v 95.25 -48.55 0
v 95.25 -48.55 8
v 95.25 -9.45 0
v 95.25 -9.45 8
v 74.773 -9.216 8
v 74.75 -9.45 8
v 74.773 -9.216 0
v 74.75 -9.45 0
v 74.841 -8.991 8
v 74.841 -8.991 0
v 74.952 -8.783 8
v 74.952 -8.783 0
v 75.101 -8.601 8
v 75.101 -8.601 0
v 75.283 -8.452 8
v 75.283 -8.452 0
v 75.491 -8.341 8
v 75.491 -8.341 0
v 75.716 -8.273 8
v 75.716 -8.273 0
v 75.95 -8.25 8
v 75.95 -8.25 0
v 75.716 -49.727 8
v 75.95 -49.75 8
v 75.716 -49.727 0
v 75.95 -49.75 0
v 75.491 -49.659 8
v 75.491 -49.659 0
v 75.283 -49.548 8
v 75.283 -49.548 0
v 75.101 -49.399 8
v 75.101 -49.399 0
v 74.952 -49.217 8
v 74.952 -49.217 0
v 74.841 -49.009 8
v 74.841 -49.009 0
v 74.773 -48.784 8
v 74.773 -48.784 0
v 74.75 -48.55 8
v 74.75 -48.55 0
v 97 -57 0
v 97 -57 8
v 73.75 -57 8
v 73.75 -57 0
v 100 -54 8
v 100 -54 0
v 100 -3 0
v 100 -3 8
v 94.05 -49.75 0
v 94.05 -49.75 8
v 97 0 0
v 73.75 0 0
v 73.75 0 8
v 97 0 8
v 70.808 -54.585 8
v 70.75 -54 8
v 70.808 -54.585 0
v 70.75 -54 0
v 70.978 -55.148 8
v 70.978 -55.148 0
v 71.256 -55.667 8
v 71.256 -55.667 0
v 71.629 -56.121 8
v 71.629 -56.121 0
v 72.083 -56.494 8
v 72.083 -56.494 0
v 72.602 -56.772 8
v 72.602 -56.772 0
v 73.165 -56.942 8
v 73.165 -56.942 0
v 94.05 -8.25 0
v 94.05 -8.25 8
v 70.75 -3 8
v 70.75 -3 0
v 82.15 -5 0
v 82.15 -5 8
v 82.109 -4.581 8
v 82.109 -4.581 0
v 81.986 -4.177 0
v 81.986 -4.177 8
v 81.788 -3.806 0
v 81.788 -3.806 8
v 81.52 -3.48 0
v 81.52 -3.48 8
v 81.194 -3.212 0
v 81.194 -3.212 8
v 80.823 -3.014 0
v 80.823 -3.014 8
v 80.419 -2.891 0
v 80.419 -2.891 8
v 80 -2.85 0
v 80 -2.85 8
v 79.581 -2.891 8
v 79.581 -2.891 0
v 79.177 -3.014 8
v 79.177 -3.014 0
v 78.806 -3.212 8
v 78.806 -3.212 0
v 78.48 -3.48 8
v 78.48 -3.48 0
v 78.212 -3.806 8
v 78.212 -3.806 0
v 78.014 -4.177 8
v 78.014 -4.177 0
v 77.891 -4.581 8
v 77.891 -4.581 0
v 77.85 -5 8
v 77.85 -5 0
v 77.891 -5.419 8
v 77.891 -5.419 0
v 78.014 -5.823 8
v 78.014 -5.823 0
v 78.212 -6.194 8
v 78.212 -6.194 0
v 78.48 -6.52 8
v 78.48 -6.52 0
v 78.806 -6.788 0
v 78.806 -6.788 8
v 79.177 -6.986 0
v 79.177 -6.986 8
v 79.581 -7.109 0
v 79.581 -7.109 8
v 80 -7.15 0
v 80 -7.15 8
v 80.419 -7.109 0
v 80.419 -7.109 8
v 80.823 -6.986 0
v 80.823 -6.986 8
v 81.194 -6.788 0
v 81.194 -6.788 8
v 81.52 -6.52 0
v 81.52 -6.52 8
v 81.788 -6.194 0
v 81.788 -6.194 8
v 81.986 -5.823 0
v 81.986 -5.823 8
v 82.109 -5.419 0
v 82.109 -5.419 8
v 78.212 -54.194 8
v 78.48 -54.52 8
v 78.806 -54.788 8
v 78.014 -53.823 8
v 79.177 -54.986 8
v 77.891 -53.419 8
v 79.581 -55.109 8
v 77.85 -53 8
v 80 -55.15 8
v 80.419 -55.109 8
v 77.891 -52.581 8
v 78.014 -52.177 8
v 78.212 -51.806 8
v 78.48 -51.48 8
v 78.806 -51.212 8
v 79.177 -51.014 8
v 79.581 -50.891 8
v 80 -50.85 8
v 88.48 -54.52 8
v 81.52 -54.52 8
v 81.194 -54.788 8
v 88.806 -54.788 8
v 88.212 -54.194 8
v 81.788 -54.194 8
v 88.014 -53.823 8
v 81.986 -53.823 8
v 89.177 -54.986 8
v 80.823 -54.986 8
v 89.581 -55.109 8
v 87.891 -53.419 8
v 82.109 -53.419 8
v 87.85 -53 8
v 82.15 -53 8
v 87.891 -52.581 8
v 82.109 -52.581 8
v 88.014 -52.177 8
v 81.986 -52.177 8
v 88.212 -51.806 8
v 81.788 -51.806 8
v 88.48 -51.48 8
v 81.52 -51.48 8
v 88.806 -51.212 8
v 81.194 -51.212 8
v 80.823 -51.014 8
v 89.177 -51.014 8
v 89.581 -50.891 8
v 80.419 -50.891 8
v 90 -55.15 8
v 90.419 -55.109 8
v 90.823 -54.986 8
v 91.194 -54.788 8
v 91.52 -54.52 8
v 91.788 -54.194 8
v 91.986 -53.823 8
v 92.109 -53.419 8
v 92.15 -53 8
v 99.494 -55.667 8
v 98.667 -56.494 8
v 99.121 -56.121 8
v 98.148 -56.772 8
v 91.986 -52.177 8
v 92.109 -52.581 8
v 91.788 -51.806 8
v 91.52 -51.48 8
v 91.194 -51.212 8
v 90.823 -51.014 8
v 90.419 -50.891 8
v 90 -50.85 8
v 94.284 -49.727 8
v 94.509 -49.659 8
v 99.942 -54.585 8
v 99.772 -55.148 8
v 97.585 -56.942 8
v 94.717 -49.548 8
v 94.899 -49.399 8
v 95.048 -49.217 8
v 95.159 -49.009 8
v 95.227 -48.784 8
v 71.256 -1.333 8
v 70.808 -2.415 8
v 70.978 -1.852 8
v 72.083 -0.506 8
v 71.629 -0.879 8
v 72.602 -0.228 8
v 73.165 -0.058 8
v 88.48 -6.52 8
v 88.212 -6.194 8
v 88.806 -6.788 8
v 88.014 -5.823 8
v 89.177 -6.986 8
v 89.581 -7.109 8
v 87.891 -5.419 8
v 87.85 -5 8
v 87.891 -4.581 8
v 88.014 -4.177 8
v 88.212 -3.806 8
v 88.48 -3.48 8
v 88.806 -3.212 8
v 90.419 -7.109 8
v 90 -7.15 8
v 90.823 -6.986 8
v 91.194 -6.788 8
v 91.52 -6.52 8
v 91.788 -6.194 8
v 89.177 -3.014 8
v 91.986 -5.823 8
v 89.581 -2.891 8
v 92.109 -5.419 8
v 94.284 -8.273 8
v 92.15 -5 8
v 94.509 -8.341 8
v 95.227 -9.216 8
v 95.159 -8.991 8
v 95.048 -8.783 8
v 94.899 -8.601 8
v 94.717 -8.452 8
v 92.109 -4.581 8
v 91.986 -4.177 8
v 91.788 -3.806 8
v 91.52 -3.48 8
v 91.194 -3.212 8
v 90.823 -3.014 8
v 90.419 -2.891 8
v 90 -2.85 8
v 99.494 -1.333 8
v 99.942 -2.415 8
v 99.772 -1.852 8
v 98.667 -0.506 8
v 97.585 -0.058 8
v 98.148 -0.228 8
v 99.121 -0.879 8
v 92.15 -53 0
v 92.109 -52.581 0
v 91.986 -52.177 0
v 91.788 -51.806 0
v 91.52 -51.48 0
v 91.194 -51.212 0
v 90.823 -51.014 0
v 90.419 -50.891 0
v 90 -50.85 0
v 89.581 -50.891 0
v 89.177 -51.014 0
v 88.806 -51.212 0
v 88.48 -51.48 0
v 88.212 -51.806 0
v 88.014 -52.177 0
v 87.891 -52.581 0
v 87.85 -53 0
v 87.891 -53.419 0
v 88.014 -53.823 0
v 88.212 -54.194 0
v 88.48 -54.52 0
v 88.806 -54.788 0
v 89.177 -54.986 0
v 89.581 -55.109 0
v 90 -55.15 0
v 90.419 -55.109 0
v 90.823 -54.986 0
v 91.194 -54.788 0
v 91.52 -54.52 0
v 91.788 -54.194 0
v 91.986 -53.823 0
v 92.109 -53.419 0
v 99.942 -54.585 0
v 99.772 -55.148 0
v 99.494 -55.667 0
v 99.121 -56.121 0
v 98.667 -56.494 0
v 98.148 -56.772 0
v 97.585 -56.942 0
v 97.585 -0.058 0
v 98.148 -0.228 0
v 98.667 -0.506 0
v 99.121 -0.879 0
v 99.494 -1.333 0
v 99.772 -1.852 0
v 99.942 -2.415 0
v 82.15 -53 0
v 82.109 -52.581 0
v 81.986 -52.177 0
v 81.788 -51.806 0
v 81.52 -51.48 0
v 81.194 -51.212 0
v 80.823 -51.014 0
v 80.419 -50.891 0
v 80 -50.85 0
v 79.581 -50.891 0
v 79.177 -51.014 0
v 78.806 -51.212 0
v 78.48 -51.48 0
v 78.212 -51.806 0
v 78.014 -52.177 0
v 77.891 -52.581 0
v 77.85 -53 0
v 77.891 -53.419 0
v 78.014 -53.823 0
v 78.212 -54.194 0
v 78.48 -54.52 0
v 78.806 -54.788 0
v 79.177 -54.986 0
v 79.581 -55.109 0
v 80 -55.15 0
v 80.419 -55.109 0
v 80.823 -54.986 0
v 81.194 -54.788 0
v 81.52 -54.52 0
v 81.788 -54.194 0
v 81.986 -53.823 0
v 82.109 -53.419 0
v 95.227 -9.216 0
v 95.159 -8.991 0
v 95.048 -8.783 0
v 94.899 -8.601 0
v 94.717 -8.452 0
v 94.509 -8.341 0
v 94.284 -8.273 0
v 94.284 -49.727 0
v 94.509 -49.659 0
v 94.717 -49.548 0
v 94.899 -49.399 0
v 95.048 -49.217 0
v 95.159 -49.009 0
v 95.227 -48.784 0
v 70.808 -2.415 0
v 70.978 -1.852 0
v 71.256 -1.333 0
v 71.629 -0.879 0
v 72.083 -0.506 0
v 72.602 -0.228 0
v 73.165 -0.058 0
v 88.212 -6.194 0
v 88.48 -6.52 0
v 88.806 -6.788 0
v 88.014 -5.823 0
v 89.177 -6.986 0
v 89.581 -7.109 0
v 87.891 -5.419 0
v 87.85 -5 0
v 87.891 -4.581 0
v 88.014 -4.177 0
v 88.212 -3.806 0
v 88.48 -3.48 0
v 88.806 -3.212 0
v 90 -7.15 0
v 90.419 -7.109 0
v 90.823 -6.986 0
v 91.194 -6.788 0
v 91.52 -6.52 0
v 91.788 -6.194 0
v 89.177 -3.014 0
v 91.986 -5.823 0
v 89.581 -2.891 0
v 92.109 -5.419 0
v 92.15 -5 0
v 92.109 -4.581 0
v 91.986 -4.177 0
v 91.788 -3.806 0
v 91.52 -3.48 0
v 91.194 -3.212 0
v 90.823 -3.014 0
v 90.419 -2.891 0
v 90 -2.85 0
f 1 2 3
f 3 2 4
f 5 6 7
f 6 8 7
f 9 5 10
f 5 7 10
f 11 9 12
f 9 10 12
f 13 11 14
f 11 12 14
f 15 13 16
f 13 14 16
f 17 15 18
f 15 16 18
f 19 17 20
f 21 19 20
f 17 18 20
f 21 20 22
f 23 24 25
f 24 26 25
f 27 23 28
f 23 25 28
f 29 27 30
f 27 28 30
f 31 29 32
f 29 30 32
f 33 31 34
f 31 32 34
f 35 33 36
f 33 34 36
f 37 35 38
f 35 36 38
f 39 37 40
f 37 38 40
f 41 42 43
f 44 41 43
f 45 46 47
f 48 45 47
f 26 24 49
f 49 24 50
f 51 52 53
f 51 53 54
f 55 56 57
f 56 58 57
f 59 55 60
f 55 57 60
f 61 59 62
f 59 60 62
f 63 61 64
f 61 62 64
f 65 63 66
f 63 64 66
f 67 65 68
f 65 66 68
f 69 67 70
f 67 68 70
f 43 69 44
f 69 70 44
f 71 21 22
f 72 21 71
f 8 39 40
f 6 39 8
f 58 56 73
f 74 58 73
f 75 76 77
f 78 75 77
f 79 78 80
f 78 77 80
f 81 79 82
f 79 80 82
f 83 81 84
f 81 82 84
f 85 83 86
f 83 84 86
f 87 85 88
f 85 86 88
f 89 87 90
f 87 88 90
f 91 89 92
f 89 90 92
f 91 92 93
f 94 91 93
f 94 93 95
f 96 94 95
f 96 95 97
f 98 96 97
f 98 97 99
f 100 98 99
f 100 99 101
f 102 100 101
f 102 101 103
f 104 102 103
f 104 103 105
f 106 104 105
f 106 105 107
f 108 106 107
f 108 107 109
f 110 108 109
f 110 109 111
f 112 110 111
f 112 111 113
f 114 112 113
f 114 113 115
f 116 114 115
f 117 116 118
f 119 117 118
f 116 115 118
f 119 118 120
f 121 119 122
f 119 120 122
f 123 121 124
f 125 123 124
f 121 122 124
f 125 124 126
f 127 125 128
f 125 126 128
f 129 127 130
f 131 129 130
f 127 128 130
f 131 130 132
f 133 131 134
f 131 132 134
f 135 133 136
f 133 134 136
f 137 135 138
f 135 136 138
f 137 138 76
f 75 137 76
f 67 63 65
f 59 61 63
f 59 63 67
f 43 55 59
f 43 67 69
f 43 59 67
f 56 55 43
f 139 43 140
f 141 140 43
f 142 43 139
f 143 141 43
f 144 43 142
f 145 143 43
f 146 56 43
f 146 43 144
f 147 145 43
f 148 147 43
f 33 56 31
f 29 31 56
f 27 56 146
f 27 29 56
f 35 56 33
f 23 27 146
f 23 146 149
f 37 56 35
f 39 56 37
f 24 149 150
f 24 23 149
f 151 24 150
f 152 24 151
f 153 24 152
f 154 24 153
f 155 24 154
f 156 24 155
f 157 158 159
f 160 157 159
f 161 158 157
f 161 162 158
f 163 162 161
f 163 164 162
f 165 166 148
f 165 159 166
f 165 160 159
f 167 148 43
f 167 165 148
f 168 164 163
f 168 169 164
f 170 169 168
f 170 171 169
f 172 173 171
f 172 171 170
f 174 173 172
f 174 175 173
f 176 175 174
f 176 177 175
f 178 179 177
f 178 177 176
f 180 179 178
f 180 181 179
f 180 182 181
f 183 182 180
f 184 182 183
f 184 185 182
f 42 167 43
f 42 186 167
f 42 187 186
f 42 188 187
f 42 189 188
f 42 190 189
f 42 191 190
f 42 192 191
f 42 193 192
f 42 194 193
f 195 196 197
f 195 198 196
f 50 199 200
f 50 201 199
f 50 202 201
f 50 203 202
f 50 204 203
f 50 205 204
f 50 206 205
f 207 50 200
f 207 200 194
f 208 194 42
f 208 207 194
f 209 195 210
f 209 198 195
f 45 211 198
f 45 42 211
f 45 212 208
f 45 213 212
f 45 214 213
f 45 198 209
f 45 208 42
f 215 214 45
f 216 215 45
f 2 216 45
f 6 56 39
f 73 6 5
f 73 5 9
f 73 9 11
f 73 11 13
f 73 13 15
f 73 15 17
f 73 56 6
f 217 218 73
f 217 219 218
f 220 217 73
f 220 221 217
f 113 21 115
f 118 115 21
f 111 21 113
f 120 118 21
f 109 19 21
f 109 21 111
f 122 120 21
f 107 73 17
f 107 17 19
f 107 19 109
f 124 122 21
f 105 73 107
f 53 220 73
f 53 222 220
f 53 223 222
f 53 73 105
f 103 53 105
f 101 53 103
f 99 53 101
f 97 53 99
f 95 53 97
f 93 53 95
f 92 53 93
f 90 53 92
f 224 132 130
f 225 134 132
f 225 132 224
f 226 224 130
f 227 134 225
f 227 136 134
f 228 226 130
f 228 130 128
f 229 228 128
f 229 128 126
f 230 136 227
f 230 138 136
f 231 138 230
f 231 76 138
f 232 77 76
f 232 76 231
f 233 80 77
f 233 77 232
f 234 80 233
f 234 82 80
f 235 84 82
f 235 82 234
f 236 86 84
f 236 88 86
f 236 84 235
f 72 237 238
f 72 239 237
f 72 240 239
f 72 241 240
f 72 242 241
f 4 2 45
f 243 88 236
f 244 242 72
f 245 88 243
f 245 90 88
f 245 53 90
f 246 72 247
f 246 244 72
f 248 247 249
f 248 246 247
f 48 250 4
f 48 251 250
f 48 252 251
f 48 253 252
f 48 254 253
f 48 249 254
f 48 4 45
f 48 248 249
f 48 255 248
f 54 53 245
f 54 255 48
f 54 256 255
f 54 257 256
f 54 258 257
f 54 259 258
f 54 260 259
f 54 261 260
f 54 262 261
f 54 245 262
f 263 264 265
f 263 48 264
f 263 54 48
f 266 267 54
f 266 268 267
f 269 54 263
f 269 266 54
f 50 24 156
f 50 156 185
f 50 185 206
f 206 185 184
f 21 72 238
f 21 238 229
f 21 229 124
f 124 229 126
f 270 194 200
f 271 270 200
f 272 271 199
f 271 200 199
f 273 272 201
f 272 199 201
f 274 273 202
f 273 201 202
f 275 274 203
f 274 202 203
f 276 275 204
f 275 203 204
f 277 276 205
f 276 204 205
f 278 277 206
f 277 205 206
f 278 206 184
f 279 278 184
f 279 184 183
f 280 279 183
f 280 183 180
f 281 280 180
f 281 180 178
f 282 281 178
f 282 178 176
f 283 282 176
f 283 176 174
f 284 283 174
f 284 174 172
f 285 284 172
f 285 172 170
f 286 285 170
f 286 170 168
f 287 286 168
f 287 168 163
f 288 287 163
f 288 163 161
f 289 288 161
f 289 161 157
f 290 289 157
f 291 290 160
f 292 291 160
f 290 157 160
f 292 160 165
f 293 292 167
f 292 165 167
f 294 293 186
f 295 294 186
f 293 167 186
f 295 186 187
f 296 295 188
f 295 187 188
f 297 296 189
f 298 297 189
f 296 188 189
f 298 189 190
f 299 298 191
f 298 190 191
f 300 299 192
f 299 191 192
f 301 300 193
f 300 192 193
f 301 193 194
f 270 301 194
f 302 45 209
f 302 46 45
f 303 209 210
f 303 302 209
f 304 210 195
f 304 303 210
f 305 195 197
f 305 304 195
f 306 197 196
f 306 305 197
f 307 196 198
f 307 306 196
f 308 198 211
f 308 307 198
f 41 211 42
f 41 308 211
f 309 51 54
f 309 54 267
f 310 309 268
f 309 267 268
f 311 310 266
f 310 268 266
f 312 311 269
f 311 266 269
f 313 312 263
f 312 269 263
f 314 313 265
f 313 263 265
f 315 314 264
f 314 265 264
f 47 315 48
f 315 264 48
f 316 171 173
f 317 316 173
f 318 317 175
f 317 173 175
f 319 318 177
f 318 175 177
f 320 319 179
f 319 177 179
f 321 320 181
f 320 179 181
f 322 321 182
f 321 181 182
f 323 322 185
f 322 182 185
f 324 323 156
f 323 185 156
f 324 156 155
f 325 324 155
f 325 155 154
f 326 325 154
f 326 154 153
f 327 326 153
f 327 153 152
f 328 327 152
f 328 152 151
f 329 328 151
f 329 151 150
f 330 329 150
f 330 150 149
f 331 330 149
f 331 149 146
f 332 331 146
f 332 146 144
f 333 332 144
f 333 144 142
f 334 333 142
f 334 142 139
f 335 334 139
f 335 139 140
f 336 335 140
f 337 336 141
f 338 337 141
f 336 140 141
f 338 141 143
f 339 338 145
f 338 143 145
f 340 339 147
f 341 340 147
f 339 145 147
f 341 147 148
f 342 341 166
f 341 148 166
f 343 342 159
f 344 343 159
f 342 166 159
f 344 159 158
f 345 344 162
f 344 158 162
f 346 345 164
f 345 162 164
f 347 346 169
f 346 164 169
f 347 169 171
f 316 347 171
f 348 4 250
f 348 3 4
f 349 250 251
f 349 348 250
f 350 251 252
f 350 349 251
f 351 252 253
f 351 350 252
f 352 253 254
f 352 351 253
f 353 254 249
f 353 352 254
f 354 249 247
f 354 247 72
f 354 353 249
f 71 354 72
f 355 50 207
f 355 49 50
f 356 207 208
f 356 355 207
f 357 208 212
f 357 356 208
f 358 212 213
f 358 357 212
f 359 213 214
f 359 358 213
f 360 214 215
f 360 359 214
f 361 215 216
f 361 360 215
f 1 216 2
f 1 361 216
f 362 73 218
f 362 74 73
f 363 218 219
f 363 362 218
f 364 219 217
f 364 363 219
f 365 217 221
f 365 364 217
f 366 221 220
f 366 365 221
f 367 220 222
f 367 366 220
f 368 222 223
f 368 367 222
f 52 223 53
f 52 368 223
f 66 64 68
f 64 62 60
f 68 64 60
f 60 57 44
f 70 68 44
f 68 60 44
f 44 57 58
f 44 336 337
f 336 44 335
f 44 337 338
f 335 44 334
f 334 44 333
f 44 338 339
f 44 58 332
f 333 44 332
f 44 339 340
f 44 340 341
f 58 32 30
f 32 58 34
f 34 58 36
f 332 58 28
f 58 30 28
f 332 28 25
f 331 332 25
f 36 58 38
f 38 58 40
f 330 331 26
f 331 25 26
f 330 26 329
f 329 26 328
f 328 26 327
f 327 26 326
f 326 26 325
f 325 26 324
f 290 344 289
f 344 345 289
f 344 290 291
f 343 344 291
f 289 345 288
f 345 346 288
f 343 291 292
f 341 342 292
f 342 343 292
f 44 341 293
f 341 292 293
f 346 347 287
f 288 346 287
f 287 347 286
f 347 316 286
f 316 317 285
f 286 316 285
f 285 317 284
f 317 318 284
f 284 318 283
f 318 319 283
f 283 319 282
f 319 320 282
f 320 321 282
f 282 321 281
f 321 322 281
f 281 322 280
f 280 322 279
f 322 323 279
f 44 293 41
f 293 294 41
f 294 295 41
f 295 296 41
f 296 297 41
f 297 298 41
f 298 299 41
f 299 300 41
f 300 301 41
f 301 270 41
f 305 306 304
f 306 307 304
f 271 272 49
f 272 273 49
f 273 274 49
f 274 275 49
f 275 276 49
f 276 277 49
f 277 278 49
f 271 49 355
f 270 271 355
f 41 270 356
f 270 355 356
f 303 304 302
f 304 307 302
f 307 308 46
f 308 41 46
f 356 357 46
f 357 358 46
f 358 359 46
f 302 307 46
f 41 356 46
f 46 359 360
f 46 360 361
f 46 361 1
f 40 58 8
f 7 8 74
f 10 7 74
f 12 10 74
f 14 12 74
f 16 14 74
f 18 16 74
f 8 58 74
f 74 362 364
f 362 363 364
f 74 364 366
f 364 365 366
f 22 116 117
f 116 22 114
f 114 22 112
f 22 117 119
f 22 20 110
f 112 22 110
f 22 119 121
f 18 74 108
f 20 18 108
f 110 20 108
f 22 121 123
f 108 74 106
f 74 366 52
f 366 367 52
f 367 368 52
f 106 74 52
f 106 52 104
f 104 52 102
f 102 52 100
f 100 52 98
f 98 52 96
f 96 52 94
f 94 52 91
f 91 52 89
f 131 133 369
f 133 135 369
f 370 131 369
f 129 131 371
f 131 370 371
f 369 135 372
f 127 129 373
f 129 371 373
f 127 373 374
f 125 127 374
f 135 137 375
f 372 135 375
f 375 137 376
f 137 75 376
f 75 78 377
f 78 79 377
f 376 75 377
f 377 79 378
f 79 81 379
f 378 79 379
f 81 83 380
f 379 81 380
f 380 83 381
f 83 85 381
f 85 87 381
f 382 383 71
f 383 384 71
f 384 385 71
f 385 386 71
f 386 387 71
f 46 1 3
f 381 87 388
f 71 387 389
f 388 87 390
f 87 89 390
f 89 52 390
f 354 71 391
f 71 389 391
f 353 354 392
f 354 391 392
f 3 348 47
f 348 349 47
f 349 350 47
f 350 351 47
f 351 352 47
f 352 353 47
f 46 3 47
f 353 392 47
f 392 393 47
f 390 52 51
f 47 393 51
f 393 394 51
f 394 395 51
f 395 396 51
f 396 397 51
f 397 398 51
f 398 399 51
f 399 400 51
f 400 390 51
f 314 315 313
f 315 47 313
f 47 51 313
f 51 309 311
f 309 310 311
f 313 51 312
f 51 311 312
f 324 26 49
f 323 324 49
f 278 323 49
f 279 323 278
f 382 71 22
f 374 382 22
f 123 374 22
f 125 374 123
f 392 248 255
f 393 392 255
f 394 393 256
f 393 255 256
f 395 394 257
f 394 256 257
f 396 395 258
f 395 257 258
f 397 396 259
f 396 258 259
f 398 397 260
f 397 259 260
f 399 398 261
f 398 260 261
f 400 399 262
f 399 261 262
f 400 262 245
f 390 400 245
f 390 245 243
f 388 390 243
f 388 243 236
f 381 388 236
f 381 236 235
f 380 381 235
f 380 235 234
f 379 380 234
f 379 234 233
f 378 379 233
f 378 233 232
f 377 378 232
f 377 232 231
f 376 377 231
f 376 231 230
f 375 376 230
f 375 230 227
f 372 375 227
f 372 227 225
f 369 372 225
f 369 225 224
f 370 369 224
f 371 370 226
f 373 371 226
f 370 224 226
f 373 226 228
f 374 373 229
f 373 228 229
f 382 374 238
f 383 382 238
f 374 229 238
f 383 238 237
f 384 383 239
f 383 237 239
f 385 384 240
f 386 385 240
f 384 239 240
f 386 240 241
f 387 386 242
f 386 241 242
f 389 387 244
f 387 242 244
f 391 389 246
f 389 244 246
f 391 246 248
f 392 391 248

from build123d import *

# Parameters (mm, degrees)
SKETCH_1_W          = 100
SKETCH_1_H          = 100
EXTRUDE_1_DEPTH     = 8
SKETCH_2_R          = 2.15
CUT_EXTRUDE_1_DEPTH = 142.647449677
SKETCH_3_R          = 2.15
CUT_EXTRUDE_2_DEPTH = 142.647449677
SKETCH_4_R          = 2.15
CUT_EXTRUDE_3_DEPTH = 142.647449677
SKETCH_5_W          = 20.5
SKETCH_5_H          = 41.5
CUT_EXTRUDE_4_DEPTH = 10
SKETCH_6_W          = 55
SKETCH_6_H          = 100
CUT_EXTRUDE_5_DEPTH = 10
FILLET_2_R          = 1.2
SKETCH_8_R          = 1.65
CUT_EXTRUDE_6_DEPTH = 142.647449677
SKETCH_9_W          = 15.75
SKETCH_9_H          = 78.5
CUT_EXTRUDE_7_DEPTH = 142.647449677
FILLET_3_R          = 10
FILLET_4_R          = 3
SKETCH_10_R         = 1.65
SKETCH_10_R_2       = 2.15
CUT_EXTRUDE_8_DEPTH = 142.647449677
FILLET_5_R          = 3


with BuildPart() as part:
    # 草图1 → 凸台-拉伸1 (new body)
    with BuildSketch(Plane.XY):
        with Locations((50, -50)):
            Rectangle(SKETCH_1_W, SKETCH_1_H)
    extrude(amount=EXTRUDE_1_DEPTH)

    # 草图2 → 切除-拉伸1 (cut, through all)
    with BuildSketch(Plane.XY.offset(8)):
        with Locations((80, -53)):
            Circle(SKETCH_2_R)
        with Locations((90, -53)):
            Circle(SKETCH_2_R)
        with Locations((90, -5)):
            Circle(SKETCH_2_R)
        with Locations((80, -5)):
            Circle(SKETCH_2_R)
    extrude(amount=-CUT_EXTRUDE_1_DEPTH, mode=Mode.SUBTRACT)

    # 草图3 → 切除-拉伸2 (cut, through all)
    with BuildSketch(Plane.XY.offset(8)):
        with Locations((73, -95)):
            Circle(SKETCH_3_R)
        with Locations((73, -85)):
            Circle(SKETCH_3_R)
        with Locations((85, -85)):
            Circle(SKETCH_3_R)
        with Locations((85, -95)):
            Circle(SKETCH_3_R)
    extrude(amount=-CUT_EXTRUDE_2_DEPTH, mode=Mode.SUBTRACT)

    # 草图4 → 切除-拉伸3 (cut, through all)
    with BuildSketch(Plane.XY.offset(8)):
        with BuildLine():
            ThreePointArc((81, -100), (71.5, -90.5), (62, -100))
            Line((62, -100), (81, -100))
        make_face()
        with Locations((73, -95)):
            Circle(SKETCH_4_R, mode=Mode.SUBTRACT)
    extrude(amount=-CUT_EXTRUDE_3_DEPTH, mode=Mode.SUBTRACT)

    # 草图5 → 切除-拉伸4 (cut)
    with BuildSketch(Plane.XY.offset(8)):
        with Locations((85, -29)):
            Rectangle(SKETCH_5_W, SKETCH_5_H)
    extrude(amount=-CUT_EXTRUDE_4_DEPTH, mode=Mode.SUBTRACT)

    # 草图6 → 切除-拉伸5 (cut)
    with BuildSketch(Plane.XY.offset(8)):
        with Locations((27.5, -50)):
            Rectangle(SKETCH_6_W, SKETCH_6_H)
    extrude(amount=-CUT_EXTRUDE_5_DEPTH, mode=Mode.SUBTRACT)

    # 圆角2
    fillet_2_edges = [part.edges().sort_by_distance(p)[0] for p in [
        (95.25, -49.75, 4),
        (74.75, -49.75, 4),
        (74.75, -8.25, 4),
        (95.25, -8.25, 4),
    ]]
    fillet(fillet_2_edges, radius=FILLET_2_R)

    # 草图8 → 切除-拉伸6 (cut, through all)
    with BuildSketch(Plane.XY.offset(8)):
        with Locations((59, -84)):
            Circle(SKETCH_8_R)
    extrude(amount=-CUT_EXTRUDE_6_DEPTH, mode=Mode.SUBTRACT)

    # 草图9 → 切除-拉伸7 (cut, through all)
    with BuildSketch(Plane.XY.offset(8)):
        with BuildLine():
            Line((71.5, -90.5), (55, -90.5))
            Line((55, -90.5), (55, -100))
            Line((55, -100), (62, -100))
            ThreePointArc((62, -100), (64.782485579, -93.282485579), (71.5, -90.5))
        make_face()
        with Locations((62.875, -39.25)):
            Rectangle(SKETCH_9_W, SKETCH_9_H)
    extrude(amount=-CUT_EXTRUDE_7_DEPTH, mode=Mode.SUBTRACT)

    # 圆角3
    fillet_3_edges = [part.edges().sort_by_distance(p)[0] for p in [
        (70.75, -78.5, 4),
    ]]
    fillet(fillet_3_edges, radius=FILLET_3_R)

    # 圆角4
    fillet_4_edges = [part.edges().sort_by_distance(p)[0] for p in [
        (55, -90.5, 4),
        (55, -78.5, 4),
        (70.75, 0, 4),
        (81, -100, 4),
        (100, 0, 4),
        (100, -100, 4),
    ]]
    fillet(fillet_4_edges, radius=FILLET_4_R)

    # 草图10 → 切除-拉伸8 (cut, through all)
    with BuildSketch(Plane.XY.offset(8)):
        with BuildLine():
            Line((100, -57), (70.75, -57))
            Line((70.75, -57), (70.75, -68.5))
            ThreePointArc((70.75, -68.5), (67.821067812, -75.571067812), (60.75, -78.5))
            Line((60.75, -78.5), (58, -78.5))
            ThreePointArc((58, -78.5), (55.878679656, -79.378679656), (55, -81.5))
            Line((55, -81.5), (55, -87.5))
            ThreePointArc((55, -87.5), (55.878679656, -89.621320344), (58, -90.5))
            Line((58, -90.5), (71.5, -90.5))
            ThreePointArc((71.5, -90.5), (77.356193303, -92.51969252), (80.722342436, -97.72))
            ThreePointArc((80.722342436, -97.72), (81.785336899, -99.362202362), (83.6346611, -100))
            Line((83.6346611, -100), (97, -100))
            ThreePointArc((97, -100), (99.121320344, -99.121320344), (100, -97))
            Line((100, -97), (100, -57))
        make_face()
        with Locations((59, -84)):
            Circle(SKETCH_10_R, mode=Mode.SUBTRACT)
        with Locations((73, -85)):
            Circle(SKETCH_10_R_2, mode=Mode.SUBTRACT)
        with Locations((85, -95)):
            Circle(SKETCH_10_R_2, mode=Mode.SUBTRACT)
        with Locations((85, -85)):
            Circle(SKETCH_10_R_2, mode=Mode.SUBTRACT)
    extrude(amount=-CUT_EXTRUDE_8_DEPTH, mode=Mode.SUBTRACT)

    # 圆角5
    fillet_5_edges = [part.edges().sort_by_distance(p)[0] for p in [
        (70.75, -57, 4),
        (100, -57, 4),
    ]]
    fillet(fillet_5_edges, radius=FILLET_5_R)


solid = part.part
